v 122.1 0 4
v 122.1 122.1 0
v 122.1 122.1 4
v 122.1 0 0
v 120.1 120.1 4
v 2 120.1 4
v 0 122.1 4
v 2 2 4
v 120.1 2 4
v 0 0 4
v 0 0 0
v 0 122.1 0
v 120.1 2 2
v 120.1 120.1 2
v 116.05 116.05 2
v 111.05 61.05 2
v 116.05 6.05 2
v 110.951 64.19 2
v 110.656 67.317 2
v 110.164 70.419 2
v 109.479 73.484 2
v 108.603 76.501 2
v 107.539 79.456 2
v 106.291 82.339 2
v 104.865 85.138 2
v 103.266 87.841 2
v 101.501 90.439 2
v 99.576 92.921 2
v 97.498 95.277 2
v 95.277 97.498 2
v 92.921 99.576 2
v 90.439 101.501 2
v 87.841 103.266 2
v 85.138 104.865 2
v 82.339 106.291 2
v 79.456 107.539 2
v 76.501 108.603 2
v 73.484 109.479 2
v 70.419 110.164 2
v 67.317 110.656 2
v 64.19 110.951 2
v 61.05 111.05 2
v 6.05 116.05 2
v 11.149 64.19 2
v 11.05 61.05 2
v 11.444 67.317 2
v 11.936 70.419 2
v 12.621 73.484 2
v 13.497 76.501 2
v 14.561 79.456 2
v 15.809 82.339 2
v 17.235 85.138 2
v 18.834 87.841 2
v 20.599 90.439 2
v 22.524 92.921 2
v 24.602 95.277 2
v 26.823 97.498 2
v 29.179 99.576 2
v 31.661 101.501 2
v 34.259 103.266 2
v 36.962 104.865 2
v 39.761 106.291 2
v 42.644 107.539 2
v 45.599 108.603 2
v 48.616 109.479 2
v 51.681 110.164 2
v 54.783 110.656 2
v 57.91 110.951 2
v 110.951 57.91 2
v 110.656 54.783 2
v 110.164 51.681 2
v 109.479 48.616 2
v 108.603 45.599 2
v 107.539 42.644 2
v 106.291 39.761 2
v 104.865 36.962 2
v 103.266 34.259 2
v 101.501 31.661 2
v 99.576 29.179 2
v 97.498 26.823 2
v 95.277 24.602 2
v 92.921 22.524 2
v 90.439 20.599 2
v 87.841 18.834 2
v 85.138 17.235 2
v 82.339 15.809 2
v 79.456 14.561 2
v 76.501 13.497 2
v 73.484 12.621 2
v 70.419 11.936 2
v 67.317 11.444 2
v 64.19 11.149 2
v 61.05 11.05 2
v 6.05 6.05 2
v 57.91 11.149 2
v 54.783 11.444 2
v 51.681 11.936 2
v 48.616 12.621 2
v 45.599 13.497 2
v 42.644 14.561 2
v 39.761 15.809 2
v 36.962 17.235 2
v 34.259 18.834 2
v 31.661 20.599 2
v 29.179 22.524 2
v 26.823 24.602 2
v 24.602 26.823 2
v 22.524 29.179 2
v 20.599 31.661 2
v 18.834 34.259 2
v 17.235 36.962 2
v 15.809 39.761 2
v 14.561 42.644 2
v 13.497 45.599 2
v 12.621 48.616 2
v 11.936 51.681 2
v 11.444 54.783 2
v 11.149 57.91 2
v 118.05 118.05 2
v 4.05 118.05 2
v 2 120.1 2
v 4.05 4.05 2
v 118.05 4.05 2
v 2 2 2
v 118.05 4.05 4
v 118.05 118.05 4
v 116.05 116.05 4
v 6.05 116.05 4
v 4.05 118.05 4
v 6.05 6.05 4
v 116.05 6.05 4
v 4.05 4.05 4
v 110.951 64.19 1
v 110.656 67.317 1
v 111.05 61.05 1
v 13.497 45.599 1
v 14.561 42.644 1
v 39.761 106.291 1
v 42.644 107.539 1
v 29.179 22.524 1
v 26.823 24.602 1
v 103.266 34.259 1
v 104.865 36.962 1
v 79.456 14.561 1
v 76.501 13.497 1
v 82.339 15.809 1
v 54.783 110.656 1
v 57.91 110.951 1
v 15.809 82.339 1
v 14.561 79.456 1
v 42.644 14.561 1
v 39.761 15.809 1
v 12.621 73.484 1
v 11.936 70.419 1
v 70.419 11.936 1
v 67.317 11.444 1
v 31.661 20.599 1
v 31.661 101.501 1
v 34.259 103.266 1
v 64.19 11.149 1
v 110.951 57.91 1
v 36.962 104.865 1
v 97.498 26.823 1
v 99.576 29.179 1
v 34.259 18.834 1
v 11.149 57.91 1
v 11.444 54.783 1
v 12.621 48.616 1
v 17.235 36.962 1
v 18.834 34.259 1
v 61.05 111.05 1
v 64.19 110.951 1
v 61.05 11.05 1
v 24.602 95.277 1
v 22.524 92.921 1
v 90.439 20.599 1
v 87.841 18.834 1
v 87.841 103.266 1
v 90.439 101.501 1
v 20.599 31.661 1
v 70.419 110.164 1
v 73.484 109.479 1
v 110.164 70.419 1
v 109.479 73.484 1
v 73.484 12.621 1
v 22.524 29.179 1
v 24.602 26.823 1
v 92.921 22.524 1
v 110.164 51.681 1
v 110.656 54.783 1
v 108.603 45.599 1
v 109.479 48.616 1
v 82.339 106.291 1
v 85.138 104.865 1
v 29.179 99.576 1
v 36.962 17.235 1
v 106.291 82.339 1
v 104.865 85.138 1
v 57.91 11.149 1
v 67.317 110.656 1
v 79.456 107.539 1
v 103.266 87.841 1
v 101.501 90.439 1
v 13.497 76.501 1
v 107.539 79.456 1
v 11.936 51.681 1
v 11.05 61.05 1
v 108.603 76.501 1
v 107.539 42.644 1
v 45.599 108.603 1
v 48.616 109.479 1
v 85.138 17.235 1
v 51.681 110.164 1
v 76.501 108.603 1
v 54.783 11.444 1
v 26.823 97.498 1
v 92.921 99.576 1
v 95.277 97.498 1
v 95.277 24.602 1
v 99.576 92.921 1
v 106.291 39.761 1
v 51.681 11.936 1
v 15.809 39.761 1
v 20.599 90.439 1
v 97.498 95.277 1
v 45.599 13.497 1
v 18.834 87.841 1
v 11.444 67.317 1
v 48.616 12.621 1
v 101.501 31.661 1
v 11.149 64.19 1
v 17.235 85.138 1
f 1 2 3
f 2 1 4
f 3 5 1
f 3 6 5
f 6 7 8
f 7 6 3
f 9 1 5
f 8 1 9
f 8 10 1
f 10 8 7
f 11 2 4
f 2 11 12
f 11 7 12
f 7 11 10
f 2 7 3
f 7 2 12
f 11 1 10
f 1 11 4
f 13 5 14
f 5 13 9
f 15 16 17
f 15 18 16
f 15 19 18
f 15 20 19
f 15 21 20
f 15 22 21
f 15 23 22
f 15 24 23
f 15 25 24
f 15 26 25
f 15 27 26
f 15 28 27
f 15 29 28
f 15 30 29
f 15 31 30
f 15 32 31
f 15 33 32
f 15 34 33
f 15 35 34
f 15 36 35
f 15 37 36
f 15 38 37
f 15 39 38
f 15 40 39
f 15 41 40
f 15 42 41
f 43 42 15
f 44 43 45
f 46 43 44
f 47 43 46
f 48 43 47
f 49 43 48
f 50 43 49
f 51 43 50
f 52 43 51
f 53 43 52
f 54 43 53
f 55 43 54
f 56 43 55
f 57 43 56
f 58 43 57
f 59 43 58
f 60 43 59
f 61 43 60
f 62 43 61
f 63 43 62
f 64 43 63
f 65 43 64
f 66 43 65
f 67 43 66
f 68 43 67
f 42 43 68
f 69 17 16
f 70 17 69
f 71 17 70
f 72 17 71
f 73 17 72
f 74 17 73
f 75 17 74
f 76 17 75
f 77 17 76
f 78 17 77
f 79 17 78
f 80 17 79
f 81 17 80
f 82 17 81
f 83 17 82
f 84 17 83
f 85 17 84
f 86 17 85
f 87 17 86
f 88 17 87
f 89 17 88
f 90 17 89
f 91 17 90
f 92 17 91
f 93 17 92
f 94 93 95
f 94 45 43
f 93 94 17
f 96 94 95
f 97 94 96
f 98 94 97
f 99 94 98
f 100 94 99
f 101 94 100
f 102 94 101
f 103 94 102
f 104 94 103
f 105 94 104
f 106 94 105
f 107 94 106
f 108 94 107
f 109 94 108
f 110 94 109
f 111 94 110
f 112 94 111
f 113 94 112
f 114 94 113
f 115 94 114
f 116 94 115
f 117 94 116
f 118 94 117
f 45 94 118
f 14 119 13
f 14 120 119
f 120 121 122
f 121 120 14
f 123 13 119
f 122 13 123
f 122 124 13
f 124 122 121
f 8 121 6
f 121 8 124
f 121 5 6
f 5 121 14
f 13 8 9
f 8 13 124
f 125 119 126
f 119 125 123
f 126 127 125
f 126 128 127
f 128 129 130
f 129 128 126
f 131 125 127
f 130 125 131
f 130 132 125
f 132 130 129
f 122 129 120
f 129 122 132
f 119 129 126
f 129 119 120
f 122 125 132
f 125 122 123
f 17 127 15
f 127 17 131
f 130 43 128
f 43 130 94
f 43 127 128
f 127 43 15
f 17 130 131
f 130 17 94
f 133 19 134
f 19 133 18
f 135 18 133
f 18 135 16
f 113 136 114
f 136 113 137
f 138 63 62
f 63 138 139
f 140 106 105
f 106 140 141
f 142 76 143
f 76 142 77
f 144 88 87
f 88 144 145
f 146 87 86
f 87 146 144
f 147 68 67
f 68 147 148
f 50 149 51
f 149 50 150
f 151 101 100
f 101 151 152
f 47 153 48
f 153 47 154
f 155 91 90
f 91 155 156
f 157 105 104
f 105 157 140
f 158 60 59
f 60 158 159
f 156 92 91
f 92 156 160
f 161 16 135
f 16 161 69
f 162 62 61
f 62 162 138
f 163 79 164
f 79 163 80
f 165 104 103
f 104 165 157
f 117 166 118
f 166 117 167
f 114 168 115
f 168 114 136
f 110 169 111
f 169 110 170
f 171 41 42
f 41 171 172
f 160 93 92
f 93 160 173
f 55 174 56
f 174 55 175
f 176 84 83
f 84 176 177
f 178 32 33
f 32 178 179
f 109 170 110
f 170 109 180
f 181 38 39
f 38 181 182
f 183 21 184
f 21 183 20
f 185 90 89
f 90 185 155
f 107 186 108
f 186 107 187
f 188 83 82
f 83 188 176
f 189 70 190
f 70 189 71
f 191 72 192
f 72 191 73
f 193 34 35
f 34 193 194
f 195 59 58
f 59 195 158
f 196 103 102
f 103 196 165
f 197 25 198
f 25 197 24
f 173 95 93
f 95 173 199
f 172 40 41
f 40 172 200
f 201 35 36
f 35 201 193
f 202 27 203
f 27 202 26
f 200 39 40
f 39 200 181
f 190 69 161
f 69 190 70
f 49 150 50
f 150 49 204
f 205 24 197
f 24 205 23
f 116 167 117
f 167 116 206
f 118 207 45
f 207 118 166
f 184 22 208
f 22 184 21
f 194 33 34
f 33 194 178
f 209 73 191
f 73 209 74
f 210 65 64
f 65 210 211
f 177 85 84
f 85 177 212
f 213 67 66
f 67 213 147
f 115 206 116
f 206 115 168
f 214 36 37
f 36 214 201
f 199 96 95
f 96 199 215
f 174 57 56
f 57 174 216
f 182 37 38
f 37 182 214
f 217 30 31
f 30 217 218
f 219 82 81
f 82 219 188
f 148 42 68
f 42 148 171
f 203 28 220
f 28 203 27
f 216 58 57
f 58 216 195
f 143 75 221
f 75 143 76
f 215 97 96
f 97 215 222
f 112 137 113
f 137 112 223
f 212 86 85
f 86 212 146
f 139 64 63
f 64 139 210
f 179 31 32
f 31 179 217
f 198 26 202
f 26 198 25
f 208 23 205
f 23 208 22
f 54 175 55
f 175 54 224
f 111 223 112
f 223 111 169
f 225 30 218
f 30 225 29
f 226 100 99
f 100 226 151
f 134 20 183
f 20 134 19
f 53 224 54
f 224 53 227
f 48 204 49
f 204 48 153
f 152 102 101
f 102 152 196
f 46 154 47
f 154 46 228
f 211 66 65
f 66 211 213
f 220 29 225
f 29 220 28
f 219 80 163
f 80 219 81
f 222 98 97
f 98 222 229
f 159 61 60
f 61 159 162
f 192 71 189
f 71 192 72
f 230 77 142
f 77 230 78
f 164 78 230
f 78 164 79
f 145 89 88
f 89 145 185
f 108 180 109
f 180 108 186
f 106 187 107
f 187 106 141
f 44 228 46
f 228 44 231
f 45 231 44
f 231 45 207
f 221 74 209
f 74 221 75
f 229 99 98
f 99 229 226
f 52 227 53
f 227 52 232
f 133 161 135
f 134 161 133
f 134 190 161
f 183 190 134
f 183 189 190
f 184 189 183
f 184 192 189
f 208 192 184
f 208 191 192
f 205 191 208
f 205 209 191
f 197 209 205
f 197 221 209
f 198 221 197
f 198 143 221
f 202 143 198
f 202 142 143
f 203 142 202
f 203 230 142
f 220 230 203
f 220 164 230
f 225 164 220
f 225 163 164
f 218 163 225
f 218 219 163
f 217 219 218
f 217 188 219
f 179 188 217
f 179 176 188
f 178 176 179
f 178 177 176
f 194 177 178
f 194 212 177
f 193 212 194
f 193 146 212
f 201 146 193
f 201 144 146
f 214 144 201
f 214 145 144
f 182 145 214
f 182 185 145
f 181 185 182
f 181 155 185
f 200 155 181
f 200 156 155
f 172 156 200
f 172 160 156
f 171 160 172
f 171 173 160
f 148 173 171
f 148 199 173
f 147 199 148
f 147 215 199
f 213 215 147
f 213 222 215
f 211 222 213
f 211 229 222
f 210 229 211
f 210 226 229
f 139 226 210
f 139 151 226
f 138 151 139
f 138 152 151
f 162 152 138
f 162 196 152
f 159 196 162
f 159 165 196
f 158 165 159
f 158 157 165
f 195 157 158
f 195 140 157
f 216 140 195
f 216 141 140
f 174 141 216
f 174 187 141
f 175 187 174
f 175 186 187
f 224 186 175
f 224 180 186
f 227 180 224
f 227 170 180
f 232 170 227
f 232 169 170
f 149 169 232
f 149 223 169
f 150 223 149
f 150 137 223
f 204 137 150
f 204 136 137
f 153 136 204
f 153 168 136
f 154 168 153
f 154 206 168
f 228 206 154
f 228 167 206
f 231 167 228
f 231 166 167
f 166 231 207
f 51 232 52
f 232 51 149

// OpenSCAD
sheet_thickness = 2.05;
wall_thickness = 2;

bracket_edge_length = 110 + (wall_thickness * 4) + (sheet_thickness * 2);
bracket_height = 4;

wall_cutout = bracket_edge_length - (wall_thickness * 2);

inner_wall_offset = wall_thickness + sheet_thickness;
inner_wall = bracket_edge_length - (inner_wall_offset * 2);

inner_cutout_offset = inner_wall_offset + wall_thickness;
inner_cutout = bracket_edge_length - (inner_cutout_offset * 2);


circular_cutout_r = 50;

difference() {
    union() {
        difference() {
            cube([bracket_edge_length, bracket_edge_length, bracket_height]);

            translate([wall_thickness, wall_thickness, wall_thickness]) {
                cube([wall_cutout, wall_cutout, wall_thickness]);
            }
        }

        difference() {
            translate([inner_wall_offset, inner_wall_offset, wall_thickness]) {
                cube([inner_wall, inner_wall, wall_thickness]);
            }

            translate([inner_cutout_offset, inner_cutout_offset, wall_thickness]) {
                cube([inner_cutout, inner_cutout, wall_thickness]);
            }
        }
    }

    translate([(bracket_edge_length / 2), (bracket_edge_length / 2), (wall_thickness / 2)]) {
        cylinder(h = 10, r = circular_cutout_r, $fn = 100);
    }
}
